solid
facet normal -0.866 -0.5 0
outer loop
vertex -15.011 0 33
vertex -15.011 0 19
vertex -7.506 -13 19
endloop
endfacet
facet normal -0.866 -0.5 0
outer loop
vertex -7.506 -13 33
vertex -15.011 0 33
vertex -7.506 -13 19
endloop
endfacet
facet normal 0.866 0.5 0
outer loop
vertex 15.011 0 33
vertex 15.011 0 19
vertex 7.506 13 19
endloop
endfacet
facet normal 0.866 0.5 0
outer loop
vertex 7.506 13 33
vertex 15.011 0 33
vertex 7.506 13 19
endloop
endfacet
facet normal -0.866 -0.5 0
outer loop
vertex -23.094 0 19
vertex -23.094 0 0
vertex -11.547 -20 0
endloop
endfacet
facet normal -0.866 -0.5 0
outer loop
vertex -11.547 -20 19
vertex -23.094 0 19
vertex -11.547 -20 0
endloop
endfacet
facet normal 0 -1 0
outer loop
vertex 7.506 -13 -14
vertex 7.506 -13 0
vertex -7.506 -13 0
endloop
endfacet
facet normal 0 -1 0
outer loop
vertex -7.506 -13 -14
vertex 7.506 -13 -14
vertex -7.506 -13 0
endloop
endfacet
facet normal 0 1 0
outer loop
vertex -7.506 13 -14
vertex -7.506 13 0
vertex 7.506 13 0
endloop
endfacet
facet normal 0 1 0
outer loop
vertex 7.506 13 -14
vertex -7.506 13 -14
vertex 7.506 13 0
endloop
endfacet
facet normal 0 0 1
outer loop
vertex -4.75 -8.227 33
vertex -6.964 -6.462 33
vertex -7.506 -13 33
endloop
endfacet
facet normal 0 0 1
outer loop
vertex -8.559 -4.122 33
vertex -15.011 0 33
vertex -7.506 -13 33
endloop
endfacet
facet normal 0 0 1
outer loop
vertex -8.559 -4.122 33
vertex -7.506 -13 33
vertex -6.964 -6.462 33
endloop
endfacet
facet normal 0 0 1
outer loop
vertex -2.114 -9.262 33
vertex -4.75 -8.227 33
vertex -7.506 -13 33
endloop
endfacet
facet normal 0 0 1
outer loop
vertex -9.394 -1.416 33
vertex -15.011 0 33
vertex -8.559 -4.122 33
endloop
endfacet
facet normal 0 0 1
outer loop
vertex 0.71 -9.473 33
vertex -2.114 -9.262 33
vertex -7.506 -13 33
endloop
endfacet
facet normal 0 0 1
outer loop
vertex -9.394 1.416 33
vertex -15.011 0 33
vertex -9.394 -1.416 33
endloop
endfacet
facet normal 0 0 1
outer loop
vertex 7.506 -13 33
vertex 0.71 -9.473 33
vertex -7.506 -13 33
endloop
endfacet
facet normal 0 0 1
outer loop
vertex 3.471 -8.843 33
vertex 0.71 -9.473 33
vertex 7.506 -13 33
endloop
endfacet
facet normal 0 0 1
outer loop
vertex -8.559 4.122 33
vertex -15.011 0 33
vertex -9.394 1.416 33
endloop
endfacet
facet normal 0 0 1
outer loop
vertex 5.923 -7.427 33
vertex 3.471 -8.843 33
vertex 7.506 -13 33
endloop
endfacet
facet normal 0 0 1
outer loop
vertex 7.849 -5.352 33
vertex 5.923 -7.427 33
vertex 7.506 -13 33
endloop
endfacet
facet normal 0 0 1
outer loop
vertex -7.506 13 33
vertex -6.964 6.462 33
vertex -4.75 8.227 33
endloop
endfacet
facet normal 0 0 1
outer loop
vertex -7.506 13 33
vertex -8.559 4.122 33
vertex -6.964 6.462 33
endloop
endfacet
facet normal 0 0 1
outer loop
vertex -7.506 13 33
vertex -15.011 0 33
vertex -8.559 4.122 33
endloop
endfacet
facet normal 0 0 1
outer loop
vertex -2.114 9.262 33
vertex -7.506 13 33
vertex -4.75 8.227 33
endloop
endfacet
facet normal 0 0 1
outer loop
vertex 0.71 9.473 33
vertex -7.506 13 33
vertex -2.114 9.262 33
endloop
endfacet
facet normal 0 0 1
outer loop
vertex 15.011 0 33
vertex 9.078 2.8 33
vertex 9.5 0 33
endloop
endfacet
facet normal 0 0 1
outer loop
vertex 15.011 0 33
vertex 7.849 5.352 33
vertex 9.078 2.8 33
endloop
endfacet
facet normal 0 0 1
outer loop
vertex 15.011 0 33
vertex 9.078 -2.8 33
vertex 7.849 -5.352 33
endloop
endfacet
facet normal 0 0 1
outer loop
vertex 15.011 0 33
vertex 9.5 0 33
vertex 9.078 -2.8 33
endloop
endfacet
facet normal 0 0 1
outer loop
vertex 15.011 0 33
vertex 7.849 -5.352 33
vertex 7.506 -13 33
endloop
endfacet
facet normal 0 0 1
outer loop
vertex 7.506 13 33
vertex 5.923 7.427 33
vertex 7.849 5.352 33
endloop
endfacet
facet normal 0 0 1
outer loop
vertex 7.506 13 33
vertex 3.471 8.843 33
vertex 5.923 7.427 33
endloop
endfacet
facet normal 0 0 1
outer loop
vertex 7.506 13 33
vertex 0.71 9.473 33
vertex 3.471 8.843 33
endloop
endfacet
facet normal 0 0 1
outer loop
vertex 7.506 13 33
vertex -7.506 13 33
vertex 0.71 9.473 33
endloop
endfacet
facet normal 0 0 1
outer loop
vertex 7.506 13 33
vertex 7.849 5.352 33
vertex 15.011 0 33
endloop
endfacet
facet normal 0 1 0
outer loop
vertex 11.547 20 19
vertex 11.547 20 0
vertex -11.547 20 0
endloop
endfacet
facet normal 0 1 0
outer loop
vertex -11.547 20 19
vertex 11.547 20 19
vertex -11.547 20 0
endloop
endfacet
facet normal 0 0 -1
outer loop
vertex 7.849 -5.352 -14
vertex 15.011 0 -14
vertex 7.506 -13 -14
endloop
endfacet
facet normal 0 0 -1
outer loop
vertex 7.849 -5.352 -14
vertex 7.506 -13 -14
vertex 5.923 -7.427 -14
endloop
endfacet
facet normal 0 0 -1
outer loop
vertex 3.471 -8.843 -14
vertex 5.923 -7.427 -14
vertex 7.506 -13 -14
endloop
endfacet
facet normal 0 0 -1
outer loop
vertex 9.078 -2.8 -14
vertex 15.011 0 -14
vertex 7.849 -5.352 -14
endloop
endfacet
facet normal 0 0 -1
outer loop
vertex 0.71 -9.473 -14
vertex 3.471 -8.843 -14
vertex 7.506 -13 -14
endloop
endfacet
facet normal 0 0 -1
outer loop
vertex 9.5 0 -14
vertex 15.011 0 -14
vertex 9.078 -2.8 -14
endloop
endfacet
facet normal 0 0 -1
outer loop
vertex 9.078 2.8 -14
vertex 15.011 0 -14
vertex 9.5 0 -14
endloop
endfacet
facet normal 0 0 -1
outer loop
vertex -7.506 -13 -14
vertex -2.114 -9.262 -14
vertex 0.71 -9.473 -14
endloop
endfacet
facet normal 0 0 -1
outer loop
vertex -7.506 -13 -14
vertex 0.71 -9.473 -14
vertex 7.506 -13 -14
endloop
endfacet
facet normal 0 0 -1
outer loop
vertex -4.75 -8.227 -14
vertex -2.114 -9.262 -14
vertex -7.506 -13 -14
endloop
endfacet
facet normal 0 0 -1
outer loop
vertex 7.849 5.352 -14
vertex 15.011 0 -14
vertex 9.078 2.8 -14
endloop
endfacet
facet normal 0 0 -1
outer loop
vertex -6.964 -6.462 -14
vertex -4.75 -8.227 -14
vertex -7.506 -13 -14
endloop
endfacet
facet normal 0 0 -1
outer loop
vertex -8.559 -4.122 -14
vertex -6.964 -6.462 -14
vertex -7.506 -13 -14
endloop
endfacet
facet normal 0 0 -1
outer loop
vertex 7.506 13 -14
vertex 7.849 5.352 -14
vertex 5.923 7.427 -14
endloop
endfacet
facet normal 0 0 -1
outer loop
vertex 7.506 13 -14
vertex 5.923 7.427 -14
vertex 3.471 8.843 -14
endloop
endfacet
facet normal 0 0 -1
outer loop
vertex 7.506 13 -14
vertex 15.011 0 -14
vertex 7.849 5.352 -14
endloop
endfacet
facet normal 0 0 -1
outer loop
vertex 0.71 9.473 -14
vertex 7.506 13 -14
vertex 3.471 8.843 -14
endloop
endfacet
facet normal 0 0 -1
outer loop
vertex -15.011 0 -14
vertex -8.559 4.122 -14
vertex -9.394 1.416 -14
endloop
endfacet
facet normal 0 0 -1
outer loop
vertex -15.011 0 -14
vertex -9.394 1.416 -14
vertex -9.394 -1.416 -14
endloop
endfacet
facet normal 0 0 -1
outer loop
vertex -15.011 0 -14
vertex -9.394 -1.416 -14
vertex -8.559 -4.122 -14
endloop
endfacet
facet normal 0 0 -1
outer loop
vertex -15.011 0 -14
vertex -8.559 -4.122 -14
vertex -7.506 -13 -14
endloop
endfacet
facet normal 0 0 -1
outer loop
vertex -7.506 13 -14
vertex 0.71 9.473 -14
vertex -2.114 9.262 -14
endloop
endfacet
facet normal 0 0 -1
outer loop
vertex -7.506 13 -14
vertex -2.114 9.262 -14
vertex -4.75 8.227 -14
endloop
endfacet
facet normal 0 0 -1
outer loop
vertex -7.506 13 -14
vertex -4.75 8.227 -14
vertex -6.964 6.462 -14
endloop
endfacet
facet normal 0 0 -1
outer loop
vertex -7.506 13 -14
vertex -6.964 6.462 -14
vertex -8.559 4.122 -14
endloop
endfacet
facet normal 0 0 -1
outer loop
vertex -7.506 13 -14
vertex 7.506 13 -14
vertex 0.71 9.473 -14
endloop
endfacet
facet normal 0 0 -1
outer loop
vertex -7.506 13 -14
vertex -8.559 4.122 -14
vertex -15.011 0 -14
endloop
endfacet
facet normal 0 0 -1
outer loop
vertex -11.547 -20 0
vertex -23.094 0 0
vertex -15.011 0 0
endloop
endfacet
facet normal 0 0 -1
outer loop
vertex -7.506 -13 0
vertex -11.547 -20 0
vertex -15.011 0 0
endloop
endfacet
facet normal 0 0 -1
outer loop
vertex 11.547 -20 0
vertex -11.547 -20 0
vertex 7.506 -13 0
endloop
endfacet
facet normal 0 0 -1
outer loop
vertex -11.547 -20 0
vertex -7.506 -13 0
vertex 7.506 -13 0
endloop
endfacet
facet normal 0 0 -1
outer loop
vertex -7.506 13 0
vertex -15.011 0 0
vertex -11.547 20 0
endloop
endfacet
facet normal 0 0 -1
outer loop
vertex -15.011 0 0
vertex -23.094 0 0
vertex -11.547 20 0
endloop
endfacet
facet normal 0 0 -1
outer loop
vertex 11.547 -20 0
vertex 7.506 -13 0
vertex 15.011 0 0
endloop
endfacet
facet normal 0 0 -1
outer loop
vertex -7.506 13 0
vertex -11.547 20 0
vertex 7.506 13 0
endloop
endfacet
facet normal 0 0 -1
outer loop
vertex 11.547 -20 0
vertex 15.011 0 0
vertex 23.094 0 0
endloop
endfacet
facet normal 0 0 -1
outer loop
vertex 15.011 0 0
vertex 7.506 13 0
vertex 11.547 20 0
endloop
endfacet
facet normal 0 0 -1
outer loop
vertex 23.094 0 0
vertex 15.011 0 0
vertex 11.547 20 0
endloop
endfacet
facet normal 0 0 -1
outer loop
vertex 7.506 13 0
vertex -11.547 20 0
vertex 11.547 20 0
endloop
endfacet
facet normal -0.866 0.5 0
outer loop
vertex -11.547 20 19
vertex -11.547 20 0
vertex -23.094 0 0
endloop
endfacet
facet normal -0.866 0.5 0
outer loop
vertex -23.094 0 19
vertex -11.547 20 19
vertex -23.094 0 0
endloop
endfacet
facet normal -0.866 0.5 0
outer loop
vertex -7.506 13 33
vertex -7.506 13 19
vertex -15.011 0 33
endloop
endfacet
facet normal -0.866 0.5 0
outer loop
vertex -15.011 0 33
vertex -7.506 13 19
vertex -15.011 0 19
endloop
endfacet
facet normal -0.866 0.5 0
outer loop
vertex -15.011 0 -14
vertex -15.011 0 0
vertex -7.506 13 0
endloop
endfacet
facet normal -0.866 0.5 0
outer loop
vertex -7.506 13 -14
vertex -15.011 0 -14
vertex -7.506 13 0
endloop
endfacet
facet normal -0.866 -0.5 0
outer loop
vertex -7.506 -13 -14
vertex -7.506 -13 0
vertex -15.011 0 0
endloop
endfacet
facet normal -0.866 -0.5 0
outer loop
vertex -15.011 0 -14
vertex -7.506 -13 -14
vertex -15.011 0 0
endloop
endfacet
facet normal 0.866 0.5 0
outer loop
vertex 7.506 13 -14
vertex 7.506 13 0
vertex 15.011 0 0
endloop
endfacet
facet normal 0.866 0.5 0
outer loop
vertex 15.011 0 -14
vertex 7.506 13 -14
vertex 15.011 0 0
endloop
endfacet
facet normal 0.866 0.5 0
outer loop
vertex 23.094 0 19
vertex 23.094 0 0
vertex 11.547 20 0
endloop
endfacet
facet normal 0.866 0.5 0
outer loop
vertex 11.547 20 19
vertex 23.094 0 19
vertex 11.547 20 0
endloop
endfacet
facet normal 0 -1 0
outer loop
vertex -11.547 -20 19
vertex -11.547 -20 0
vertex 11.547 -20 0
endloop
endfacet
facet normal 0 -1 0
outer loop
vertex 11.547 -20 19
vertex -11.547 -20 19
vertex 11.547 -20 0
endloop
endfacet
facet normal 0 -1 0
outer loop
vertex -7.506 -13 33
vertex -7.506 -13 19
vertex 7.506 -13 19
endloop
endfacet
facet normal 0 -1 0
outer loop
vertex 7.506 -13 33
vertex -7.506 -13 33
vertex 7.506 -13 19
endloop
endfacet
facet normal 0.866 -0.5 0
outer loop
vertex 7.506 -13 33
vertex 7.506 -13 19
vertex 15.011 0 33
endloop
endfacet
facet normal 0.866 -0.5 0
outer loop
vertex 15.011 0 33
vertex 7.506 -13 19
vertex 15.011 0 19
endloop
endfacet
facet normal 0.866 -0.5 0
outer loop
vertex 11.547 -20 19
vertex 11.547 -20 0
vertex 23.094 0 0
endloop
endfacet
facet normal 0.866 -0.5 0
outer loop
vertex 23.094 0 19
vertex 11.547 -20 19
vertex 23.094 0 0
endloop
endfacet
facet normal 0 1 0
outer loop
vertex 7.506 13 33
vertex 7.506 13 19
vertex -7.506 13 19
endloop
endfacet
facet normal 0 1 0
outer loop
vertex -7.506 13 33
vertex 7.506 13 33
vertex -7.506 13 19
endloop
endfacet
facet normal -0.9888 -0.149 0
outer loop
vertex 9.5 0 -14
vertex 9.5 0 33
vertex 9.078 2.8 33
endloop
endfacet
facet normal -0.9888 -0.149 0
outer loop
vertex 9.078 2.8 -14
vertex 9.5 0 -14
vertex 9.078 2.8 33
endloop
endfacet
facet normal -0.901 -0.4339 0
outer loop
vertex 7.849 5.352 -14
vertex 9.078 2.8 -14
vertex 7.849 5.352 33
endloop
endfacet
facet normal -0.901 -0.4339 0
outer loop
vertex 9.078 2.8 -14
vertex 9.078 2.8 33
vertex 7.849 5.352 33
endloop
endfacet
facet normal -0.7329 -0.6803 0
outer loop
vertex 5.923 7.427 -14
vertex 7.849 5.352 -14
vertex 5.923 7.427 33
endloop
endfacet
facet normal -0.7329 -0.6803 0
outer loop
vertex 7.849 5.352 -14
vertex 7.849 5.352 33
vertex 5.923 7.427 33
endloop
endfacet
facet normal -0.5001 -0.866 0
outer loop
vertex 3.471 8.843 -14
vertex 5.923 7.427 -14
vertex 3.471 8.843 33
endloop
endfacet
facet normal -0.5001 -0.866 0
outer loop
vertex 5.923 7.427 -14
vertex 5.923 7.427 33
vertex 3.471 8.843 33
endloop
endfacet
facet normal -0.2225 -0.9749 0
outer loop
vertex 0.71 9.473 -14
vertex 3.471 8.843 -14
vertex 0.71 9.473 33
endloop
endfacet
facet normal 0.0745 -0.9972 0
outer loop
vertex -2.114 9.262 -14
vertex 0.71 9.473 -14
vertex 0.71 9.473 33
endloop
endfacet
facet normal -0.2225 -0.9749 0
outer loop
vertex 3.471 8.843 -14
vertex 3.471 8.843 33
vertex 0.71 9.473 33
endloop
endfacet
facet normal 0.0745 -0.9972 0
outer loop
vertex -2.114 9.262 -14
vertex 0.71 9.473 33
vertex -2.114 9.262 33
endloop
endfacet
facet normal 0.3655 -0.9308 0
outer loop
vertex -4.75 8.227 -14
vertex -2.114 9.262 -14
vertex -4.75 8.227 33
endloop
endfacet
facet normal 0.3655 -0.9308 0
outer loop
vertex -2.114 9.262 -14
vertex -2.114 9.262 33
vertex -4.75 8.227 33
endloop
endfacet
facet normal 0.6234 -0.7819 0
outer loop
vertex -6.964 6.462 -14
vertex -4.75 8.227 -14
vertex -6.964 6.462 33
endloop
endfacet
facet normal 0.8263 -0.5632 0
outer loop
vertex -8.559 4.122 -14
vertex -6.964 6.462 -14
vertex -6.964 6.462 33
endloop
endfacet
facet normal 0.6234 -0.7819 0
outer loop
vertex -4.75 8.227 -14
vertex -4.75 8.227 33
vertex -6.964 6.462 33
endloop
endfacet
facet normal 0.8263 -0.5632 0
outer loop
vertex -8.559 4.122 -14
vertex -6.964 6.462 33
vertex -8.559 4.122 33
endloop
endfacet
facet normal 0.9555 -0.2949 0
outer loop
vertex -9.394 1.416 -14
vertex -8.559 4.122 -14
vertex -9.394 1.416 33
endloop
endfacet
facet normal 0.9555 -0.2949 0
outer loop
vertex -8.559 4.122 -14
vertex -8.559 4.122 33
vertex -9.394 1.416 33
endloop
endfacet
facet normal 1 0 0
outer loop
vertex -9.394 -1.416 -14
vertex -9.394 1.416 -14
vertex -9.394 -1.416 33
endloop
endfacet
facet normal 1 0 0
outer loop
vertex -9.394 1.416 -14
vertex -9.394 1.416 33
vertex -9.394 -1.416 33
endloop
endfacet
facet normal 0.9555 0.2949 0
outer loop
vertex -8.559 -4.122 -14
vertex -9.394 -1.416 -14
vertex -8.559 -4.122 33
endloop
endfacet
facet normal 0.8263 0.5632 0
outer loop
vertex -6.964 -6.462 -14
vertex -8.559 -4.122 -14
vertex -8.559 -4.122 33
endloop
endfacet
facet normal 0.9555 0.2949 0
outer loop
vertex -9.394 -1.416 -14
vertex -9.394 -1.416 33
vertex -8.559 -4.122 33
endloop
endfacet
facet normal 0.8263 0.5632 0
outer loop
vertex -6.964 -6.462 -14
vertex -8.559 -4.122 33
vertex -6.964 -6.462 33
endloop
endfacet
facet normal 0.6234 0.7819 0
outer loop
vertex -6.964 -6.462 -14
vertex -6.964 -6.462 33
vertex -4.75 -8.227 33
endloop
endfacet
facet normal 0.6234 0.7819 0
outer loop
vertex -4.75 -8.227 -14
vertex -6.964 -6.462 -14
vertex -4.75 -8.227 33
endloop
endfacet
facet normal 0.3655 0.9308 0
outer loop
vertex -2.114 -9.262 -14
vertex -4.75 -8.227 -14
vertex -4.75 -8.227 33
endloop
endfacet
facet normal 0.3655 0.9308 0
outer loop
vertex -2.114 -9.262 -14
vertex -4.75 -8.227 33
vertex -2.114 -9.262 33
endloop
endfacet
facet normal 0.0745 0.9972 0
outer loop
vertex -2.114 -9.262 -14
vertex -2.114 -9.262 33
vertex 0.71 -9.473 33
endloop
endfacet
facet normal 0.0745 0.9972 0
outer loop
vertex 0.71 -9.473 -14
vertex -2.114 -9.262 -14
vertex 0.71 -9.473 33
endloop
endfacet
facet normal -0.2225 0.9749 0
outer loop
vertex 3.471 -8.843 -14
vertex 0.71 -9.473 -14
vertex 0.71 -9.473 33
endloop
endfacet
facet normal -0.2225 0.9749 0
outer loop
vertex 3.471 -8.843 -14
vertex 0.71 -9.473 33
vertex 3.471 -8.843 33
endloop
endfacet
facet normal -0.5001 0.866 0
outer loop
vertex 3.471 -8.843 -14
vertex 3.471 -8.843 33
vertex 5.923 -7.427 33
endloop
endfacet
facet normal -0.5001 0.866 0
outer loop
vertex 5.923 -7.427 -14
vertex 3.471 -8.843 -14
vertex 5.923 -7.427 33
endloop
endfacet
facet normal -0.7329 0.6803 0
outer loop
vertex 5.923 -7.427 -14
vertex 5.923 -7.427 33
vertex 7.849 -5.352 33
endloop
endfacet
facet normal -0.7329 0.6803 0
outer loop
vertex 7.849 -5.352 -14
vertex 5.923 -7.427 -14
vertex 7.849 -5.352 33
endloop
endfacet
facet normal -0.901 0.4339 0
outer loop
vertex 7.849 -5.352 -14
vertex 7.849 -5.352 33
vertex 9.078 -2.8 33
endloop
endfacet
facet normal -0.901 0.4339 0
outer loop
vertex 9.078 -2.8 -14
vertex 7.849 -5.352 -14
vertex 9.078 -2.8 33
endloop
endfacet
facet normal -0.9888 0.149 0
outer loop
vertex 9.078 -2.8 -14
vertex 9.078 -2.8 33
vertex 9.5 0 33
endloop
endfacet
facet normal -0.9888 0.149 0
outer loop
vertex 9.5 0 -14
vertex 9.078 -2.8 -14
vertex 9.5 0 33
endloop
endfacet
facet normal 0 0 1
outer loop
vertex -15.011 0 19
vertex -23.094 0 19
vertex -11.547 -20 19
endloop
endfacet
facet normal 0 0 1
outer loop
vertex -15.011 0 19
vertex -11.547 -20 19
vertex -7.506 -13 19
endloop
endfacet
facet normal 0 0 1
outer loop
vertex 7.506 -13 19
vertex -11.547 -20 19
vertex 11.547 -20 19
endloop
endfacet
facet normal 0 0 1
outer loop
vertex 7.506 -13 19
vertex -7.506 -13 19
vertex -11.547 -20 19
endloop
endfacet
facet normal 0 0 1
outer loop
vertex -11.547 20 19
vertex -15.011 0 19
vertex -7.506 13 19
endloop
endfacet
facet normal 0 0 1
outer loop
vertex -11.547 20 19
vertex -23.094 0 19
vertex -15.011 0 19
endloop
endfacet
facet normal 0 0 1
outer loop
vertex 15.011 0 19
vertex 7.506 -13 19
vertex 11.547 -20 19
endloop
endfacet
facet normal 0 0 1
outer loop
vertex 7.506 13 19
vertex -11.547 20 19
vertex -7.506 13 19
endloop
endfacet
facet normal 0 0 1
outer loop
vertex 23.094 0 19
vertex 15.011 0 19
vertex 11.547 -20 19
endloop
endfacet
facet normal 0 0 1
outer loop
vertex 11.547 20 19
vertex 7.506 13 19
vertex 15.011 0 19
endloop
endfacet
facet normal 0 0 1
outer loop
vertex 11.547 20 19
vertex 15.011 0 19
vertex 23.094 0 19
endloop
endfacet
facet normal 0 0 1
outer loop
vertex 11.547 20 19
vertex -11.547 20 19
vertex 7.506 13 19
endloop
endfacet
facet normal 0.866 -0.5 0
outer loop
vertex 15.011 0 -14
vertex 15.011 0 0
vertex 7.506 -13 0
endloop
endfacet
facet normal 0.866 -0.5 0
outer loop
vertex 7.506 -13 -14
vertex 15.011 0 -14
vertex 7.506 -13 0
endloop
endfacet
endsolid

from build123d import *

# Parameters (mm, degrees)
BASIS_LINEAR_AUSTRAGEN_DEPTH    = 19
AUFSATZ_LINEAR_AUSTRAGEN1_DEPTH = 14
AUFSATZ_LINEAR_AUSTRAGEN2_DEPTH = 14
SKIZZE4_R                       = 9.5
SCHNITT_LINEAR_AUSTRAGEN1_DEPTH = 57.056519098


with BuildPart() as part:
    # Skizze1 → Basis-Linear austragen (new body)
    with BuildSketch(Plane.XY):
        Polygon((11.547005384, -20), (23.094010768, 0), (11.547005384, 20), (-11.547005384, 20), (-23.094010768, 0), (-11.547005384, -20), align=None)
    extrude(amount=BASIS_LINEAR_AUSTRAGEN_DEPTH)

    # Skizze2 → Aufsatz-Linear austragen1 (add)
    with BuildSketch(Plane.XY.offset(19)):
        Polygon((7.505553499, -13), (15.011106999, 0), (7.505553499, 13), (-7.505553499, 13), (-15.011106999, 0), (-7.505553499, -13), align=None)
    extrude(amount=AUFSATZ_LINEAR_AUSTRAGEN1_DEPTH)

    # Skizze3 → Aufsatz-Linear austragen2 (add)
    with BuildSketch(Plane(origin=(0, 0, 0), x_dir=(-1, 0, 0), z_dir=(0, 0, -1))):
        Polygon((7.505553499, -13), (15.011106999, 0), (7.505553499, 13), (-7.505553499, 13), (-15.011106999, 0), (-7.505553499, -13), align=None)
    extrude(amount=AUFSATZ_LINEAR_AUSTRAGEN2_DEPTH)

    # Skizze4 → Schnitt-Linear austragen1 (cut, through all)
    with BuildSketch(Plane.XY.offset(33)):
        Circle(SKIZZE4_R)
    extrude(amount=-SCHNITT_LINEAR_AUSTRAGEN1_DEPTH, mode=Mode.SUBTRACT)


solid = part.part
